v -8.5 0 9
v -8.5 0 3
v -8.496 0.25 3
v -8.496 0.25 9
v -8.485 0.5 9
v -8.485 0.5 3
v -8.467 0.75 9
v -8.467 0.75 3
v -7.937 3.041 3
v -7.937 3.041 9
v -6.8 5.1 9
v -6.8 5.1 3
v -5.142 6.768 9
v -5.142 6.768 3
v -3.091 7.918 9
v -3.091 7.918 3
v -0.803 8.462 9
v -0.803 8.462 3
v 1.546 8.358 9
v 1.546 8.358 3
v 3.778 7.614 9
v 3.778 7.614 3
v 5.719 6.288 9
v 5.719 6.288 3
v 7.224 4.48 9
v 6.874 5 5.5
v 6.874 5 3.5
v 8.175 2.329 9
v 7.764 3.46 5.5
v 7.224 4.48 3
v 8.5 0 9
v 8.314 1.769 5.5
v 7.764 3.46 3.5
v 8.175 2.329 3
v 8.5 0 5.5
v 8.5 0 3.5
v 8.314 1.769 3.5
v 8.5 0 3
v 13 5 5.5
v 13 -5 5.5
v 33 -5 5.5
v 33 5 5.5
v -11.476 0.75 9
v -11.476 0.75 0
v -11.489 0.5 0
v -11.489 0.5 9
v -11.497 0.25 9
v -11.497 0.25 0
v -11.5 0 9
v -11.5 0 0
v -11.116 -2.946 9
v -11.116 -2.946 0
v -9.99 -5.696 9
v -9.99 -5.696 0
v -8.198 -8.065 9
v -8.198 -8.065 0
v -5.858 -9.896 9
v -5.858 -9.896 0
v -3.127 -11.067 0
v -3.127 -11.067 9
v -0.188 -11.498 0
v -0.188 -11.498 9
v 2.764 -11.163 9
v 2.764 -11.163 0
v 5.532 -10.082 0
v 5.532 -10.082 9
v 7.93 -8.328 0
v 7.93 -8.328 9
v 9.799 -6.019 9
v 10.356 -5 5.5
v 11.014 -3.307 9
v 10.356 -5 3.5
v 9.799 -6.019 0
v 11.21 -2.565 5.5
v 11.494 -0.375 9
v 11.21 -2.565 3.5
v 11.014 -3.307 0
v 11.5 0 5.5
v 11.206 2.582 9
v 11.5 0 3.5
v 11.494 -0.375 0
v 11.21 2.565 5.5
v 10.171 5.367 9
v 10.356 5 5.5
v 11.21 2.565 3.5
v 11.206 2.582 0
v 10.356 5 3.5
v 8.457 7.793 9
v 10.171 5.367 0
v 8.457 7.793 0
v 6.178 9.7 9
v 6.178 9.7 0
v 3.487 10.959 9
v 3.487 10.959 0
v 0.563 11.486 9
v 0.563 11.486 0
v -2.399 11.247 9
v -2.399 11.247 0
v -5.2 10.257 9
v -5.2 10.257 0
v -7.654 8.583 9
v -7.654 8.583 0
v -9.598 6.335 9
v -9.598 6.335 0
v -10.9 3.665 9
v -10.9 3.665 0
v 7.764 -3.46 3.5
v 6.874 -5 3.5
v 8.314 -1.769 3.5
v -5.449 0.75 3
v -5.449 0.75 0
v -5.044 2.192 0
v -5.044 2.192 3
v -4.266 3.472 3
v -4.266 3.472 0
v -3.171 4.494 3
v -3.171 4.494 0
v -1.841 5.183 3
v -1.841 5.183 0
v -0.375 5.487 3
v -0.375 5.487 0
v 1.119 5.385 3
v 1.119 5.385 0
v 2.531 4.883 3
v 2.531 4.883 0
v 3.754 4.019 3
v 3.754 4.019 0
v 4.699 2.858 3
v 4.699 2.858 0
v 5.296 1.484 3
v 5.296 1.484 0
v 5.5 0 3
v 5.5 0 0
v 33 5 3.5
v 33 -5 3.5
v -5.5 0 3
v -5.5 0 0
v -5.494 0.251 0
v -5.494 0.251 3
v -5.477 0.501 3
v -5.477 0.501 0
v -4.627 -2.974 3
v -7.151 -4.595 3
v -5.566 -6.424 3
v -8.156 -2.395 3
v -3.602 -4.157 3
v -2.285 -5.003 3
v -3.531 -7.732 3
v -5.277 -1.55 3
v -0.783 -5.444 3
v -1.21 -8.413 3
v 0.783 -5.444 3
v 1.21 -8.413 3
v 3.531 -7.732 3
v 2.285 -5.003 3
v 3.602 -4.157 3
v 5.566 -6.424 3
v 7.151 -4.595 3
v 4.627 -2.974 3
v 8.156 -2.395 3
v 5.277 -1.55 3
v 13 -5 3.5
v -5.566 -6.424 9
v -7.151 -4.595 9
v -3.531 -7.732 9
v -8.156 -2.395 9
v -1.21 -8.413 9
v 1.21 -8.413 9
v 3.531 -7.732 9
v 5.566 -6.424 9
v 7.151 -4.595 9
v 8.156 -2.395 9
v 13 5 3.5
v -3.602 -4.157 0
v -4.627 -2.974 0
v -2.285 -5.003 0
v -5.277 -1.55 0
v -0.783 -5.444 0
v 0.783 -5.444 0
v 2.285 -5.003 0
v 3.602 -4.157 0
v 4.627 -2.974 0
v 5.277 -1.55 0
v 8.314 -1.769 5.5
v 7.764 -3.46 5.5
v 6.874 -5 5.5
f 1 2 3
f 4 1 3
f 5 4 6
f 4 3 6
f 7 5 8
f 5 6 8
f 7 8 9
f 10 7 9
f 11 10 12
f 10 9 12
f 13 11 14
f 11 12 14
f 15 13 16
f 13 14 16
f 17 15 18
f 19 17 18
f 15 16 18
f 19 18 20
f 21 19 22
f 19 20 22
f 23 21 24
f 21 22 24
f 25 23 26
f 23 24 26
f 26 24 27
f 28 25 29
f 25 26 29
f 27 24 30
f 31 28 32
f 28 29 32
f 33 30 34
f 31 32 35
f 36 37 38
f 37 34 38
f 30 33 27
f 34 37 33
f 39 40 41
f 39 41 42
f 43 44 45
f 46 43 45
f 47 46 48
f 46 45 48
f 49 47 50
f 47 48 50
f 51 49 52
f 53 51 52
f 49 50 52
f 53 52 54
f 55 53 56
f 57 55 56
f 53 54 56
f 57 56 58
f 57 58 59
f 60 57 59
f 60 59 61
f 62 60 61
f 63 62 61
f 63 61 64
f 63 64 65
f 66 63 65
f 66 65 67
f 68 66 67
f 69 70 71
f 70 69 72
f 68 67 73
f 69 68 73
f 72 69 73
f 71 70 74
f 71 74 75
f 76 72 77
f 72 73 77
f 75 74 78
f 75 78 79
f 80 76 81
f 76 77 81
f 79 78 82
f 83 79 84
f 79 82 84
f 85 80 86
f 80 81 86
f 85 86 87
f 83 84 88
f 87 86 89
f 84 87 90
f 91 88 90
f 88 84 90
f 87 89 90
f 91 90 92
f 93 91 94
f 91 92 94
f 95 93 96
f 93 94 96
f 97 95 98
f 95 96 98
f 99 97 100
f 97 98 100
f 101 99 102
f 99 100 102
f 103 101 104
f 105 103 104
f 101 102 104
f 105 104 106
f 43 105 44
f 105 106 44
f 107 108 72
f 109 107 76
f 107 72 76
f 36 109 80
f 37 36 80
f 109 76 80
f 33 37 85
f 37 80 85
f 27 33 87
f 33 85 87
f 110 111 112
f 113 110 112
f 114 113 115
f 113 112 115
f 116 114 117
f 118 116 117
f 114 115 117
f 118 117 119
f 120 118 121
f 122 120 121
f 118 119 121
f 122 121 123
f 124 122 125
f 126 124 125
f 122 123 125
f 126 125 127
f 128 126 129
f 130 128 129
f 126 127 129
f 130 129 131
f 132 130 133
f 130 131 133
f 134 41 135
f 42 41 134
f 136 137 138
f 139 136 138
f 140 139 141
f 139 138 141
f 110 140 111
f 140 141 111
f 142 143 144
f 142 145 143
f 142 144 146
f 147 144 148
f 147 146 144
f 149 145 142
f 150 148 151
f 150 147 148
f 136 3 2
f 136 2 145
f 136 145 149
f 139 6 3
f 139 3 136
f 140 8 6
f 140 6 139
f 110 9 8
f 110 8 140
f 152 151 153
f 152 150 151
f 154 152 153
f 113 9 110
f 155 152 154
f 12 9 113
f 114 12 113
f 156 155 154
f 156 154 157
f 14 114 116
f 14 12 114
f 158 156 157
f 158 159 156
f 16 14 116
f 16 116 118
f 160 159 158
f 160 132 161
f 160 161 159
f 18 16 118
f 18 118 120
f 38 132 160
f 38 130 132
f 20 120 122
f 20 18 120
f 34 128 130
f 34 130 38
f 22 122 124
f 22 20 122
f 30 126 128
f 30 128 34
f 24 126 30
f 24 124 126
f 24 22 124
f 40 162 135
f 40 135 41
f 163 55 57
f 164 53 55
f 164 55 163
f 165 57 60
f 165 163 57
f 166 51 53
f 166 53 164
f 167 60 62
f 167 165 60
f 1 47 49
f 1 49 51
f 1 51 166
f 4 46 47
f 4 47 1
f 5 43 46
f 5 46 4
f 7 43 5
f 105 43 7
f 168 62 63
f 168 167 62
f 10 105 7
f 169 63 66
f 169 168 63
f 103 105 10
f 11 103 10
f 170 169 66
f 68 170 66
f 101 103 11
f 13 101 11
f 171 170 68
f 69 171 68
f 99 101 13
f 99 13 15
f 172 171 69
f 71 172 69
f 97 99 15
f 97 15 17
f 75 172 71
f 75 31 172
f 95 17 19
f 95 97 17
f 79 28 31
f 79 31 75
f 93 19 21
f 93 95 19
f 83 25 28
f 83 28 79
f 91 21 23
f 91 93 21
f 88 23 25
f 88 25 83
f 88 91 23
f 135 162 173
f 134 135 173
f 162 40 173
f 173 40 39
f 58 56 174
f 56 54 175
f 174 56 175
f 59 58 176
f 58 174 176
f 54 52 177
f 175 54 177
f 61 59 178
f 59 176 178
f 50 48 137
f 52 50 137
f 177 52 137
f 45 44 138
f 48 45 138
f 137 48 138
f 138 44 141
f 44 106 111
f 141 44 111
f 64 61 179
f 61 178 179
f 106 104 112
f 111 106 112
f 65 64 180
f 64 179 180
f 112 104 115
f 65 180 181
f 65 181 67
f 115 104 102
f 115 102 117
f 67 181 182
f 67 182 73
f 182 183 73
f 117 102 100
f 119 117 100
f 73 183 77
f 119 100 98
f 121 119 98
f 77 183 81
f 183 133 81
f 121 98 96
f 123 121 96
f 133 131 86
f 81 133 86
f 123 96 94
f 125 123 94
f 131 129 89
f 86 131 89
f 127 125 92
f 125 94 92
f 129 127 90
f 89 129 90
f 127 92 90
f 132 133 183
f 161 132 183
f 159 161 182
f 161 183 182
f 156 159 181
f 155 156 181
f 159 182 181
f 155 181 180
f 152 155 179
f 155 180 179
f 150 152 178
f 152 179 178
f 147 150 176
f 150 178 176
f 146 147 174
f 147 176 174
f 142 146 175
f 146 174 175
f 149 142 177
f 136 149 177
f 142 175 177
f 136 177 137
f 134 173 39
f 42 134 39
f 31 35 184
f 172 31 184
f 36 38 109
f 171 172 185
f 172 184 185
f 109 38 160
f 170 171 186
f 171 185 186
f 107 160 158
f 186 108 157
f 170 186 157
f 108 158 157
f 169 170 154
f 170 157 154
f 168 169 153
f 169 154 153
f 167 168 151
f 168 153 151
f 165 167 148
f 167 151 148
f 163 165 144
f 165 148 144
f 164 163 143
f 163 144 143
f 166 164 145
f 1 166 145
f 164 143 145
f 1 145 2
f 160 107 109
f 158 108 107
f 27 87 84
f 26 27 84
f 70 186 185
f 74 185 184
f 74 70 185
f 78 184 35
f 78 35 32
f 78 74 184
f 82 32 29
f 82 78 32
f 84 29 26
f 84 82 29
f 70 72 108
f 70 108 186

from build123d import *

# Parameters (mm, degrees)
F1_DEPTH = 3
F2_DEPTH = 9
F4_W     = 10
F4_H     = 2
F5_DEPTH = 12.20318
F6_DEPTH = 20


with BuildPart() as f1:
    # F0 (on Top) → F1 (new body)
    with BuildSketch(Plane.XY):
        with BuildLine():
            Line((-5.4486236794, 0.75), (-8.4668471109, 0.75))
            ThreePointArc((-8.4668471109, 0.75), (-8.4917077329, 0.3753661926), (-8.5, 0))
            Line((-8.5, 0), (-5.5, 0))
            ThreePointArc((-5.5, 0), (-5.4871408874, 0.3758788124), (-5.4486236794, 0.75))
        make_face()
        with BuildLine():
            ThreePointArc((-8.5, 0), (0, -8.5), (8.5, 0))
            ThreePointArc((8.5, 0), (0.3753661926, 8.4917077329), (-8.4668471109, 0.75))
            Line((-8.4668471109, 0.75), (-5.4486236794, 0.75))
            ThreePointArc((-5.4486236794, 0.75), (0.3758788124, 5.4871408874), (5.5, 0))
            ThreePointArc((5.5, 0), (0, -5.5), (-5.5, 0))
            Line((-5.5, 0), (-8.5, 0))
        make_face()
        with BuildLine():
            ThreePointArc((-8.5, 0), (-8.4917077329, 0.3753661926), (-8.4668471109, 0.75))
            Line((-8.4668471109, 0.75), (-11.4755174175, 0.75))
            ThreePointArc((-11.4755174175, 0.75), (-11.4938777247, 0.3751997458), (-11.5, 0))
            Line((-11.5, 0), (-8.5, 0))
        make_face()
        with BuildLine():
            ThreePointArc((-8.4668471109, 0.75), (0.3753661926, 8.4917077329), (8.5, 0))
            ThreePointArc((8.5, 0), (0, -8.5), (-8.5, 0))
            Line((-8.5, 0), (-11.5, 0))
            ThreePointArc((-11.5, 0), (0, -11.5), (11.5, 0))
            ThreePointArc((11.5, 0), (0.3751997458, 11.4938777247), (-11.4755174175, 0.75))
            Line((-11.4755174175, 0.75), (-8.4668471109, 0.75))
        make_face()
    extrude(amount=F1_DEPTH)

    # F0 (on Top) → F2 (join)
    with BuildSketch(Plane.XY):
        with BuildLine():
            ThreePointArc((-8.5, 0), (-8.4917077329, 0.3753661926), (-8.4668471109, 0.75))
            Line((-8.4668471109, 0.75), (-11.4755174175, 0.75))
            ThreePointArc((-11.4755174175, 0.75), (-11.4938777247, 0.3751997458), (-11.5, 0))
            Line((-11.5, 0), (-8.5, 0))
        make_face()
        with BuildLine():
            ThreePointArc((-8.4668471109, 0.75), (0.3753661926, 8.4917077329), (8.5, 0))
            ThreePointArc((8.5, 0), (0, -8.5), (-8.5, 0))
            Line((-8.5, 0), (-11.5, 0))
            ThreePointArc((-11.5, 0), (0, -11.5), (11.5, 0))
            ThreePointArc((11.5, 0), (0.3751997458, 11.4938777247), (-11.4755174175, 0.75))
            Line((-11.4755174175, 0.75), (-8.4668471109, 0.75))
        make_face()
    extrude(amount=F2_DEPTH)

    # F4 (on offset) → F5 (cut)
    with BuildSketch(Plane.YZ.offset(13)):
        with Locations((0, 4.5)):
            Rectangle(F4_W, F4_H)
    extrude(amount=-F5_DEPTH, mode=Mode.SUBTRACT)


with BuildPart() as f6:
    # F4 (on offset) → F6 (new body)
    with BuildSketch(Plane.YZ.offset(13)):
        with Locations((0, 4.5)):
            Rectangle(F4_W, F4_H)
    extrude(amount=F6_DEPTH)


solid = Compound([f1.part, f6.part])
